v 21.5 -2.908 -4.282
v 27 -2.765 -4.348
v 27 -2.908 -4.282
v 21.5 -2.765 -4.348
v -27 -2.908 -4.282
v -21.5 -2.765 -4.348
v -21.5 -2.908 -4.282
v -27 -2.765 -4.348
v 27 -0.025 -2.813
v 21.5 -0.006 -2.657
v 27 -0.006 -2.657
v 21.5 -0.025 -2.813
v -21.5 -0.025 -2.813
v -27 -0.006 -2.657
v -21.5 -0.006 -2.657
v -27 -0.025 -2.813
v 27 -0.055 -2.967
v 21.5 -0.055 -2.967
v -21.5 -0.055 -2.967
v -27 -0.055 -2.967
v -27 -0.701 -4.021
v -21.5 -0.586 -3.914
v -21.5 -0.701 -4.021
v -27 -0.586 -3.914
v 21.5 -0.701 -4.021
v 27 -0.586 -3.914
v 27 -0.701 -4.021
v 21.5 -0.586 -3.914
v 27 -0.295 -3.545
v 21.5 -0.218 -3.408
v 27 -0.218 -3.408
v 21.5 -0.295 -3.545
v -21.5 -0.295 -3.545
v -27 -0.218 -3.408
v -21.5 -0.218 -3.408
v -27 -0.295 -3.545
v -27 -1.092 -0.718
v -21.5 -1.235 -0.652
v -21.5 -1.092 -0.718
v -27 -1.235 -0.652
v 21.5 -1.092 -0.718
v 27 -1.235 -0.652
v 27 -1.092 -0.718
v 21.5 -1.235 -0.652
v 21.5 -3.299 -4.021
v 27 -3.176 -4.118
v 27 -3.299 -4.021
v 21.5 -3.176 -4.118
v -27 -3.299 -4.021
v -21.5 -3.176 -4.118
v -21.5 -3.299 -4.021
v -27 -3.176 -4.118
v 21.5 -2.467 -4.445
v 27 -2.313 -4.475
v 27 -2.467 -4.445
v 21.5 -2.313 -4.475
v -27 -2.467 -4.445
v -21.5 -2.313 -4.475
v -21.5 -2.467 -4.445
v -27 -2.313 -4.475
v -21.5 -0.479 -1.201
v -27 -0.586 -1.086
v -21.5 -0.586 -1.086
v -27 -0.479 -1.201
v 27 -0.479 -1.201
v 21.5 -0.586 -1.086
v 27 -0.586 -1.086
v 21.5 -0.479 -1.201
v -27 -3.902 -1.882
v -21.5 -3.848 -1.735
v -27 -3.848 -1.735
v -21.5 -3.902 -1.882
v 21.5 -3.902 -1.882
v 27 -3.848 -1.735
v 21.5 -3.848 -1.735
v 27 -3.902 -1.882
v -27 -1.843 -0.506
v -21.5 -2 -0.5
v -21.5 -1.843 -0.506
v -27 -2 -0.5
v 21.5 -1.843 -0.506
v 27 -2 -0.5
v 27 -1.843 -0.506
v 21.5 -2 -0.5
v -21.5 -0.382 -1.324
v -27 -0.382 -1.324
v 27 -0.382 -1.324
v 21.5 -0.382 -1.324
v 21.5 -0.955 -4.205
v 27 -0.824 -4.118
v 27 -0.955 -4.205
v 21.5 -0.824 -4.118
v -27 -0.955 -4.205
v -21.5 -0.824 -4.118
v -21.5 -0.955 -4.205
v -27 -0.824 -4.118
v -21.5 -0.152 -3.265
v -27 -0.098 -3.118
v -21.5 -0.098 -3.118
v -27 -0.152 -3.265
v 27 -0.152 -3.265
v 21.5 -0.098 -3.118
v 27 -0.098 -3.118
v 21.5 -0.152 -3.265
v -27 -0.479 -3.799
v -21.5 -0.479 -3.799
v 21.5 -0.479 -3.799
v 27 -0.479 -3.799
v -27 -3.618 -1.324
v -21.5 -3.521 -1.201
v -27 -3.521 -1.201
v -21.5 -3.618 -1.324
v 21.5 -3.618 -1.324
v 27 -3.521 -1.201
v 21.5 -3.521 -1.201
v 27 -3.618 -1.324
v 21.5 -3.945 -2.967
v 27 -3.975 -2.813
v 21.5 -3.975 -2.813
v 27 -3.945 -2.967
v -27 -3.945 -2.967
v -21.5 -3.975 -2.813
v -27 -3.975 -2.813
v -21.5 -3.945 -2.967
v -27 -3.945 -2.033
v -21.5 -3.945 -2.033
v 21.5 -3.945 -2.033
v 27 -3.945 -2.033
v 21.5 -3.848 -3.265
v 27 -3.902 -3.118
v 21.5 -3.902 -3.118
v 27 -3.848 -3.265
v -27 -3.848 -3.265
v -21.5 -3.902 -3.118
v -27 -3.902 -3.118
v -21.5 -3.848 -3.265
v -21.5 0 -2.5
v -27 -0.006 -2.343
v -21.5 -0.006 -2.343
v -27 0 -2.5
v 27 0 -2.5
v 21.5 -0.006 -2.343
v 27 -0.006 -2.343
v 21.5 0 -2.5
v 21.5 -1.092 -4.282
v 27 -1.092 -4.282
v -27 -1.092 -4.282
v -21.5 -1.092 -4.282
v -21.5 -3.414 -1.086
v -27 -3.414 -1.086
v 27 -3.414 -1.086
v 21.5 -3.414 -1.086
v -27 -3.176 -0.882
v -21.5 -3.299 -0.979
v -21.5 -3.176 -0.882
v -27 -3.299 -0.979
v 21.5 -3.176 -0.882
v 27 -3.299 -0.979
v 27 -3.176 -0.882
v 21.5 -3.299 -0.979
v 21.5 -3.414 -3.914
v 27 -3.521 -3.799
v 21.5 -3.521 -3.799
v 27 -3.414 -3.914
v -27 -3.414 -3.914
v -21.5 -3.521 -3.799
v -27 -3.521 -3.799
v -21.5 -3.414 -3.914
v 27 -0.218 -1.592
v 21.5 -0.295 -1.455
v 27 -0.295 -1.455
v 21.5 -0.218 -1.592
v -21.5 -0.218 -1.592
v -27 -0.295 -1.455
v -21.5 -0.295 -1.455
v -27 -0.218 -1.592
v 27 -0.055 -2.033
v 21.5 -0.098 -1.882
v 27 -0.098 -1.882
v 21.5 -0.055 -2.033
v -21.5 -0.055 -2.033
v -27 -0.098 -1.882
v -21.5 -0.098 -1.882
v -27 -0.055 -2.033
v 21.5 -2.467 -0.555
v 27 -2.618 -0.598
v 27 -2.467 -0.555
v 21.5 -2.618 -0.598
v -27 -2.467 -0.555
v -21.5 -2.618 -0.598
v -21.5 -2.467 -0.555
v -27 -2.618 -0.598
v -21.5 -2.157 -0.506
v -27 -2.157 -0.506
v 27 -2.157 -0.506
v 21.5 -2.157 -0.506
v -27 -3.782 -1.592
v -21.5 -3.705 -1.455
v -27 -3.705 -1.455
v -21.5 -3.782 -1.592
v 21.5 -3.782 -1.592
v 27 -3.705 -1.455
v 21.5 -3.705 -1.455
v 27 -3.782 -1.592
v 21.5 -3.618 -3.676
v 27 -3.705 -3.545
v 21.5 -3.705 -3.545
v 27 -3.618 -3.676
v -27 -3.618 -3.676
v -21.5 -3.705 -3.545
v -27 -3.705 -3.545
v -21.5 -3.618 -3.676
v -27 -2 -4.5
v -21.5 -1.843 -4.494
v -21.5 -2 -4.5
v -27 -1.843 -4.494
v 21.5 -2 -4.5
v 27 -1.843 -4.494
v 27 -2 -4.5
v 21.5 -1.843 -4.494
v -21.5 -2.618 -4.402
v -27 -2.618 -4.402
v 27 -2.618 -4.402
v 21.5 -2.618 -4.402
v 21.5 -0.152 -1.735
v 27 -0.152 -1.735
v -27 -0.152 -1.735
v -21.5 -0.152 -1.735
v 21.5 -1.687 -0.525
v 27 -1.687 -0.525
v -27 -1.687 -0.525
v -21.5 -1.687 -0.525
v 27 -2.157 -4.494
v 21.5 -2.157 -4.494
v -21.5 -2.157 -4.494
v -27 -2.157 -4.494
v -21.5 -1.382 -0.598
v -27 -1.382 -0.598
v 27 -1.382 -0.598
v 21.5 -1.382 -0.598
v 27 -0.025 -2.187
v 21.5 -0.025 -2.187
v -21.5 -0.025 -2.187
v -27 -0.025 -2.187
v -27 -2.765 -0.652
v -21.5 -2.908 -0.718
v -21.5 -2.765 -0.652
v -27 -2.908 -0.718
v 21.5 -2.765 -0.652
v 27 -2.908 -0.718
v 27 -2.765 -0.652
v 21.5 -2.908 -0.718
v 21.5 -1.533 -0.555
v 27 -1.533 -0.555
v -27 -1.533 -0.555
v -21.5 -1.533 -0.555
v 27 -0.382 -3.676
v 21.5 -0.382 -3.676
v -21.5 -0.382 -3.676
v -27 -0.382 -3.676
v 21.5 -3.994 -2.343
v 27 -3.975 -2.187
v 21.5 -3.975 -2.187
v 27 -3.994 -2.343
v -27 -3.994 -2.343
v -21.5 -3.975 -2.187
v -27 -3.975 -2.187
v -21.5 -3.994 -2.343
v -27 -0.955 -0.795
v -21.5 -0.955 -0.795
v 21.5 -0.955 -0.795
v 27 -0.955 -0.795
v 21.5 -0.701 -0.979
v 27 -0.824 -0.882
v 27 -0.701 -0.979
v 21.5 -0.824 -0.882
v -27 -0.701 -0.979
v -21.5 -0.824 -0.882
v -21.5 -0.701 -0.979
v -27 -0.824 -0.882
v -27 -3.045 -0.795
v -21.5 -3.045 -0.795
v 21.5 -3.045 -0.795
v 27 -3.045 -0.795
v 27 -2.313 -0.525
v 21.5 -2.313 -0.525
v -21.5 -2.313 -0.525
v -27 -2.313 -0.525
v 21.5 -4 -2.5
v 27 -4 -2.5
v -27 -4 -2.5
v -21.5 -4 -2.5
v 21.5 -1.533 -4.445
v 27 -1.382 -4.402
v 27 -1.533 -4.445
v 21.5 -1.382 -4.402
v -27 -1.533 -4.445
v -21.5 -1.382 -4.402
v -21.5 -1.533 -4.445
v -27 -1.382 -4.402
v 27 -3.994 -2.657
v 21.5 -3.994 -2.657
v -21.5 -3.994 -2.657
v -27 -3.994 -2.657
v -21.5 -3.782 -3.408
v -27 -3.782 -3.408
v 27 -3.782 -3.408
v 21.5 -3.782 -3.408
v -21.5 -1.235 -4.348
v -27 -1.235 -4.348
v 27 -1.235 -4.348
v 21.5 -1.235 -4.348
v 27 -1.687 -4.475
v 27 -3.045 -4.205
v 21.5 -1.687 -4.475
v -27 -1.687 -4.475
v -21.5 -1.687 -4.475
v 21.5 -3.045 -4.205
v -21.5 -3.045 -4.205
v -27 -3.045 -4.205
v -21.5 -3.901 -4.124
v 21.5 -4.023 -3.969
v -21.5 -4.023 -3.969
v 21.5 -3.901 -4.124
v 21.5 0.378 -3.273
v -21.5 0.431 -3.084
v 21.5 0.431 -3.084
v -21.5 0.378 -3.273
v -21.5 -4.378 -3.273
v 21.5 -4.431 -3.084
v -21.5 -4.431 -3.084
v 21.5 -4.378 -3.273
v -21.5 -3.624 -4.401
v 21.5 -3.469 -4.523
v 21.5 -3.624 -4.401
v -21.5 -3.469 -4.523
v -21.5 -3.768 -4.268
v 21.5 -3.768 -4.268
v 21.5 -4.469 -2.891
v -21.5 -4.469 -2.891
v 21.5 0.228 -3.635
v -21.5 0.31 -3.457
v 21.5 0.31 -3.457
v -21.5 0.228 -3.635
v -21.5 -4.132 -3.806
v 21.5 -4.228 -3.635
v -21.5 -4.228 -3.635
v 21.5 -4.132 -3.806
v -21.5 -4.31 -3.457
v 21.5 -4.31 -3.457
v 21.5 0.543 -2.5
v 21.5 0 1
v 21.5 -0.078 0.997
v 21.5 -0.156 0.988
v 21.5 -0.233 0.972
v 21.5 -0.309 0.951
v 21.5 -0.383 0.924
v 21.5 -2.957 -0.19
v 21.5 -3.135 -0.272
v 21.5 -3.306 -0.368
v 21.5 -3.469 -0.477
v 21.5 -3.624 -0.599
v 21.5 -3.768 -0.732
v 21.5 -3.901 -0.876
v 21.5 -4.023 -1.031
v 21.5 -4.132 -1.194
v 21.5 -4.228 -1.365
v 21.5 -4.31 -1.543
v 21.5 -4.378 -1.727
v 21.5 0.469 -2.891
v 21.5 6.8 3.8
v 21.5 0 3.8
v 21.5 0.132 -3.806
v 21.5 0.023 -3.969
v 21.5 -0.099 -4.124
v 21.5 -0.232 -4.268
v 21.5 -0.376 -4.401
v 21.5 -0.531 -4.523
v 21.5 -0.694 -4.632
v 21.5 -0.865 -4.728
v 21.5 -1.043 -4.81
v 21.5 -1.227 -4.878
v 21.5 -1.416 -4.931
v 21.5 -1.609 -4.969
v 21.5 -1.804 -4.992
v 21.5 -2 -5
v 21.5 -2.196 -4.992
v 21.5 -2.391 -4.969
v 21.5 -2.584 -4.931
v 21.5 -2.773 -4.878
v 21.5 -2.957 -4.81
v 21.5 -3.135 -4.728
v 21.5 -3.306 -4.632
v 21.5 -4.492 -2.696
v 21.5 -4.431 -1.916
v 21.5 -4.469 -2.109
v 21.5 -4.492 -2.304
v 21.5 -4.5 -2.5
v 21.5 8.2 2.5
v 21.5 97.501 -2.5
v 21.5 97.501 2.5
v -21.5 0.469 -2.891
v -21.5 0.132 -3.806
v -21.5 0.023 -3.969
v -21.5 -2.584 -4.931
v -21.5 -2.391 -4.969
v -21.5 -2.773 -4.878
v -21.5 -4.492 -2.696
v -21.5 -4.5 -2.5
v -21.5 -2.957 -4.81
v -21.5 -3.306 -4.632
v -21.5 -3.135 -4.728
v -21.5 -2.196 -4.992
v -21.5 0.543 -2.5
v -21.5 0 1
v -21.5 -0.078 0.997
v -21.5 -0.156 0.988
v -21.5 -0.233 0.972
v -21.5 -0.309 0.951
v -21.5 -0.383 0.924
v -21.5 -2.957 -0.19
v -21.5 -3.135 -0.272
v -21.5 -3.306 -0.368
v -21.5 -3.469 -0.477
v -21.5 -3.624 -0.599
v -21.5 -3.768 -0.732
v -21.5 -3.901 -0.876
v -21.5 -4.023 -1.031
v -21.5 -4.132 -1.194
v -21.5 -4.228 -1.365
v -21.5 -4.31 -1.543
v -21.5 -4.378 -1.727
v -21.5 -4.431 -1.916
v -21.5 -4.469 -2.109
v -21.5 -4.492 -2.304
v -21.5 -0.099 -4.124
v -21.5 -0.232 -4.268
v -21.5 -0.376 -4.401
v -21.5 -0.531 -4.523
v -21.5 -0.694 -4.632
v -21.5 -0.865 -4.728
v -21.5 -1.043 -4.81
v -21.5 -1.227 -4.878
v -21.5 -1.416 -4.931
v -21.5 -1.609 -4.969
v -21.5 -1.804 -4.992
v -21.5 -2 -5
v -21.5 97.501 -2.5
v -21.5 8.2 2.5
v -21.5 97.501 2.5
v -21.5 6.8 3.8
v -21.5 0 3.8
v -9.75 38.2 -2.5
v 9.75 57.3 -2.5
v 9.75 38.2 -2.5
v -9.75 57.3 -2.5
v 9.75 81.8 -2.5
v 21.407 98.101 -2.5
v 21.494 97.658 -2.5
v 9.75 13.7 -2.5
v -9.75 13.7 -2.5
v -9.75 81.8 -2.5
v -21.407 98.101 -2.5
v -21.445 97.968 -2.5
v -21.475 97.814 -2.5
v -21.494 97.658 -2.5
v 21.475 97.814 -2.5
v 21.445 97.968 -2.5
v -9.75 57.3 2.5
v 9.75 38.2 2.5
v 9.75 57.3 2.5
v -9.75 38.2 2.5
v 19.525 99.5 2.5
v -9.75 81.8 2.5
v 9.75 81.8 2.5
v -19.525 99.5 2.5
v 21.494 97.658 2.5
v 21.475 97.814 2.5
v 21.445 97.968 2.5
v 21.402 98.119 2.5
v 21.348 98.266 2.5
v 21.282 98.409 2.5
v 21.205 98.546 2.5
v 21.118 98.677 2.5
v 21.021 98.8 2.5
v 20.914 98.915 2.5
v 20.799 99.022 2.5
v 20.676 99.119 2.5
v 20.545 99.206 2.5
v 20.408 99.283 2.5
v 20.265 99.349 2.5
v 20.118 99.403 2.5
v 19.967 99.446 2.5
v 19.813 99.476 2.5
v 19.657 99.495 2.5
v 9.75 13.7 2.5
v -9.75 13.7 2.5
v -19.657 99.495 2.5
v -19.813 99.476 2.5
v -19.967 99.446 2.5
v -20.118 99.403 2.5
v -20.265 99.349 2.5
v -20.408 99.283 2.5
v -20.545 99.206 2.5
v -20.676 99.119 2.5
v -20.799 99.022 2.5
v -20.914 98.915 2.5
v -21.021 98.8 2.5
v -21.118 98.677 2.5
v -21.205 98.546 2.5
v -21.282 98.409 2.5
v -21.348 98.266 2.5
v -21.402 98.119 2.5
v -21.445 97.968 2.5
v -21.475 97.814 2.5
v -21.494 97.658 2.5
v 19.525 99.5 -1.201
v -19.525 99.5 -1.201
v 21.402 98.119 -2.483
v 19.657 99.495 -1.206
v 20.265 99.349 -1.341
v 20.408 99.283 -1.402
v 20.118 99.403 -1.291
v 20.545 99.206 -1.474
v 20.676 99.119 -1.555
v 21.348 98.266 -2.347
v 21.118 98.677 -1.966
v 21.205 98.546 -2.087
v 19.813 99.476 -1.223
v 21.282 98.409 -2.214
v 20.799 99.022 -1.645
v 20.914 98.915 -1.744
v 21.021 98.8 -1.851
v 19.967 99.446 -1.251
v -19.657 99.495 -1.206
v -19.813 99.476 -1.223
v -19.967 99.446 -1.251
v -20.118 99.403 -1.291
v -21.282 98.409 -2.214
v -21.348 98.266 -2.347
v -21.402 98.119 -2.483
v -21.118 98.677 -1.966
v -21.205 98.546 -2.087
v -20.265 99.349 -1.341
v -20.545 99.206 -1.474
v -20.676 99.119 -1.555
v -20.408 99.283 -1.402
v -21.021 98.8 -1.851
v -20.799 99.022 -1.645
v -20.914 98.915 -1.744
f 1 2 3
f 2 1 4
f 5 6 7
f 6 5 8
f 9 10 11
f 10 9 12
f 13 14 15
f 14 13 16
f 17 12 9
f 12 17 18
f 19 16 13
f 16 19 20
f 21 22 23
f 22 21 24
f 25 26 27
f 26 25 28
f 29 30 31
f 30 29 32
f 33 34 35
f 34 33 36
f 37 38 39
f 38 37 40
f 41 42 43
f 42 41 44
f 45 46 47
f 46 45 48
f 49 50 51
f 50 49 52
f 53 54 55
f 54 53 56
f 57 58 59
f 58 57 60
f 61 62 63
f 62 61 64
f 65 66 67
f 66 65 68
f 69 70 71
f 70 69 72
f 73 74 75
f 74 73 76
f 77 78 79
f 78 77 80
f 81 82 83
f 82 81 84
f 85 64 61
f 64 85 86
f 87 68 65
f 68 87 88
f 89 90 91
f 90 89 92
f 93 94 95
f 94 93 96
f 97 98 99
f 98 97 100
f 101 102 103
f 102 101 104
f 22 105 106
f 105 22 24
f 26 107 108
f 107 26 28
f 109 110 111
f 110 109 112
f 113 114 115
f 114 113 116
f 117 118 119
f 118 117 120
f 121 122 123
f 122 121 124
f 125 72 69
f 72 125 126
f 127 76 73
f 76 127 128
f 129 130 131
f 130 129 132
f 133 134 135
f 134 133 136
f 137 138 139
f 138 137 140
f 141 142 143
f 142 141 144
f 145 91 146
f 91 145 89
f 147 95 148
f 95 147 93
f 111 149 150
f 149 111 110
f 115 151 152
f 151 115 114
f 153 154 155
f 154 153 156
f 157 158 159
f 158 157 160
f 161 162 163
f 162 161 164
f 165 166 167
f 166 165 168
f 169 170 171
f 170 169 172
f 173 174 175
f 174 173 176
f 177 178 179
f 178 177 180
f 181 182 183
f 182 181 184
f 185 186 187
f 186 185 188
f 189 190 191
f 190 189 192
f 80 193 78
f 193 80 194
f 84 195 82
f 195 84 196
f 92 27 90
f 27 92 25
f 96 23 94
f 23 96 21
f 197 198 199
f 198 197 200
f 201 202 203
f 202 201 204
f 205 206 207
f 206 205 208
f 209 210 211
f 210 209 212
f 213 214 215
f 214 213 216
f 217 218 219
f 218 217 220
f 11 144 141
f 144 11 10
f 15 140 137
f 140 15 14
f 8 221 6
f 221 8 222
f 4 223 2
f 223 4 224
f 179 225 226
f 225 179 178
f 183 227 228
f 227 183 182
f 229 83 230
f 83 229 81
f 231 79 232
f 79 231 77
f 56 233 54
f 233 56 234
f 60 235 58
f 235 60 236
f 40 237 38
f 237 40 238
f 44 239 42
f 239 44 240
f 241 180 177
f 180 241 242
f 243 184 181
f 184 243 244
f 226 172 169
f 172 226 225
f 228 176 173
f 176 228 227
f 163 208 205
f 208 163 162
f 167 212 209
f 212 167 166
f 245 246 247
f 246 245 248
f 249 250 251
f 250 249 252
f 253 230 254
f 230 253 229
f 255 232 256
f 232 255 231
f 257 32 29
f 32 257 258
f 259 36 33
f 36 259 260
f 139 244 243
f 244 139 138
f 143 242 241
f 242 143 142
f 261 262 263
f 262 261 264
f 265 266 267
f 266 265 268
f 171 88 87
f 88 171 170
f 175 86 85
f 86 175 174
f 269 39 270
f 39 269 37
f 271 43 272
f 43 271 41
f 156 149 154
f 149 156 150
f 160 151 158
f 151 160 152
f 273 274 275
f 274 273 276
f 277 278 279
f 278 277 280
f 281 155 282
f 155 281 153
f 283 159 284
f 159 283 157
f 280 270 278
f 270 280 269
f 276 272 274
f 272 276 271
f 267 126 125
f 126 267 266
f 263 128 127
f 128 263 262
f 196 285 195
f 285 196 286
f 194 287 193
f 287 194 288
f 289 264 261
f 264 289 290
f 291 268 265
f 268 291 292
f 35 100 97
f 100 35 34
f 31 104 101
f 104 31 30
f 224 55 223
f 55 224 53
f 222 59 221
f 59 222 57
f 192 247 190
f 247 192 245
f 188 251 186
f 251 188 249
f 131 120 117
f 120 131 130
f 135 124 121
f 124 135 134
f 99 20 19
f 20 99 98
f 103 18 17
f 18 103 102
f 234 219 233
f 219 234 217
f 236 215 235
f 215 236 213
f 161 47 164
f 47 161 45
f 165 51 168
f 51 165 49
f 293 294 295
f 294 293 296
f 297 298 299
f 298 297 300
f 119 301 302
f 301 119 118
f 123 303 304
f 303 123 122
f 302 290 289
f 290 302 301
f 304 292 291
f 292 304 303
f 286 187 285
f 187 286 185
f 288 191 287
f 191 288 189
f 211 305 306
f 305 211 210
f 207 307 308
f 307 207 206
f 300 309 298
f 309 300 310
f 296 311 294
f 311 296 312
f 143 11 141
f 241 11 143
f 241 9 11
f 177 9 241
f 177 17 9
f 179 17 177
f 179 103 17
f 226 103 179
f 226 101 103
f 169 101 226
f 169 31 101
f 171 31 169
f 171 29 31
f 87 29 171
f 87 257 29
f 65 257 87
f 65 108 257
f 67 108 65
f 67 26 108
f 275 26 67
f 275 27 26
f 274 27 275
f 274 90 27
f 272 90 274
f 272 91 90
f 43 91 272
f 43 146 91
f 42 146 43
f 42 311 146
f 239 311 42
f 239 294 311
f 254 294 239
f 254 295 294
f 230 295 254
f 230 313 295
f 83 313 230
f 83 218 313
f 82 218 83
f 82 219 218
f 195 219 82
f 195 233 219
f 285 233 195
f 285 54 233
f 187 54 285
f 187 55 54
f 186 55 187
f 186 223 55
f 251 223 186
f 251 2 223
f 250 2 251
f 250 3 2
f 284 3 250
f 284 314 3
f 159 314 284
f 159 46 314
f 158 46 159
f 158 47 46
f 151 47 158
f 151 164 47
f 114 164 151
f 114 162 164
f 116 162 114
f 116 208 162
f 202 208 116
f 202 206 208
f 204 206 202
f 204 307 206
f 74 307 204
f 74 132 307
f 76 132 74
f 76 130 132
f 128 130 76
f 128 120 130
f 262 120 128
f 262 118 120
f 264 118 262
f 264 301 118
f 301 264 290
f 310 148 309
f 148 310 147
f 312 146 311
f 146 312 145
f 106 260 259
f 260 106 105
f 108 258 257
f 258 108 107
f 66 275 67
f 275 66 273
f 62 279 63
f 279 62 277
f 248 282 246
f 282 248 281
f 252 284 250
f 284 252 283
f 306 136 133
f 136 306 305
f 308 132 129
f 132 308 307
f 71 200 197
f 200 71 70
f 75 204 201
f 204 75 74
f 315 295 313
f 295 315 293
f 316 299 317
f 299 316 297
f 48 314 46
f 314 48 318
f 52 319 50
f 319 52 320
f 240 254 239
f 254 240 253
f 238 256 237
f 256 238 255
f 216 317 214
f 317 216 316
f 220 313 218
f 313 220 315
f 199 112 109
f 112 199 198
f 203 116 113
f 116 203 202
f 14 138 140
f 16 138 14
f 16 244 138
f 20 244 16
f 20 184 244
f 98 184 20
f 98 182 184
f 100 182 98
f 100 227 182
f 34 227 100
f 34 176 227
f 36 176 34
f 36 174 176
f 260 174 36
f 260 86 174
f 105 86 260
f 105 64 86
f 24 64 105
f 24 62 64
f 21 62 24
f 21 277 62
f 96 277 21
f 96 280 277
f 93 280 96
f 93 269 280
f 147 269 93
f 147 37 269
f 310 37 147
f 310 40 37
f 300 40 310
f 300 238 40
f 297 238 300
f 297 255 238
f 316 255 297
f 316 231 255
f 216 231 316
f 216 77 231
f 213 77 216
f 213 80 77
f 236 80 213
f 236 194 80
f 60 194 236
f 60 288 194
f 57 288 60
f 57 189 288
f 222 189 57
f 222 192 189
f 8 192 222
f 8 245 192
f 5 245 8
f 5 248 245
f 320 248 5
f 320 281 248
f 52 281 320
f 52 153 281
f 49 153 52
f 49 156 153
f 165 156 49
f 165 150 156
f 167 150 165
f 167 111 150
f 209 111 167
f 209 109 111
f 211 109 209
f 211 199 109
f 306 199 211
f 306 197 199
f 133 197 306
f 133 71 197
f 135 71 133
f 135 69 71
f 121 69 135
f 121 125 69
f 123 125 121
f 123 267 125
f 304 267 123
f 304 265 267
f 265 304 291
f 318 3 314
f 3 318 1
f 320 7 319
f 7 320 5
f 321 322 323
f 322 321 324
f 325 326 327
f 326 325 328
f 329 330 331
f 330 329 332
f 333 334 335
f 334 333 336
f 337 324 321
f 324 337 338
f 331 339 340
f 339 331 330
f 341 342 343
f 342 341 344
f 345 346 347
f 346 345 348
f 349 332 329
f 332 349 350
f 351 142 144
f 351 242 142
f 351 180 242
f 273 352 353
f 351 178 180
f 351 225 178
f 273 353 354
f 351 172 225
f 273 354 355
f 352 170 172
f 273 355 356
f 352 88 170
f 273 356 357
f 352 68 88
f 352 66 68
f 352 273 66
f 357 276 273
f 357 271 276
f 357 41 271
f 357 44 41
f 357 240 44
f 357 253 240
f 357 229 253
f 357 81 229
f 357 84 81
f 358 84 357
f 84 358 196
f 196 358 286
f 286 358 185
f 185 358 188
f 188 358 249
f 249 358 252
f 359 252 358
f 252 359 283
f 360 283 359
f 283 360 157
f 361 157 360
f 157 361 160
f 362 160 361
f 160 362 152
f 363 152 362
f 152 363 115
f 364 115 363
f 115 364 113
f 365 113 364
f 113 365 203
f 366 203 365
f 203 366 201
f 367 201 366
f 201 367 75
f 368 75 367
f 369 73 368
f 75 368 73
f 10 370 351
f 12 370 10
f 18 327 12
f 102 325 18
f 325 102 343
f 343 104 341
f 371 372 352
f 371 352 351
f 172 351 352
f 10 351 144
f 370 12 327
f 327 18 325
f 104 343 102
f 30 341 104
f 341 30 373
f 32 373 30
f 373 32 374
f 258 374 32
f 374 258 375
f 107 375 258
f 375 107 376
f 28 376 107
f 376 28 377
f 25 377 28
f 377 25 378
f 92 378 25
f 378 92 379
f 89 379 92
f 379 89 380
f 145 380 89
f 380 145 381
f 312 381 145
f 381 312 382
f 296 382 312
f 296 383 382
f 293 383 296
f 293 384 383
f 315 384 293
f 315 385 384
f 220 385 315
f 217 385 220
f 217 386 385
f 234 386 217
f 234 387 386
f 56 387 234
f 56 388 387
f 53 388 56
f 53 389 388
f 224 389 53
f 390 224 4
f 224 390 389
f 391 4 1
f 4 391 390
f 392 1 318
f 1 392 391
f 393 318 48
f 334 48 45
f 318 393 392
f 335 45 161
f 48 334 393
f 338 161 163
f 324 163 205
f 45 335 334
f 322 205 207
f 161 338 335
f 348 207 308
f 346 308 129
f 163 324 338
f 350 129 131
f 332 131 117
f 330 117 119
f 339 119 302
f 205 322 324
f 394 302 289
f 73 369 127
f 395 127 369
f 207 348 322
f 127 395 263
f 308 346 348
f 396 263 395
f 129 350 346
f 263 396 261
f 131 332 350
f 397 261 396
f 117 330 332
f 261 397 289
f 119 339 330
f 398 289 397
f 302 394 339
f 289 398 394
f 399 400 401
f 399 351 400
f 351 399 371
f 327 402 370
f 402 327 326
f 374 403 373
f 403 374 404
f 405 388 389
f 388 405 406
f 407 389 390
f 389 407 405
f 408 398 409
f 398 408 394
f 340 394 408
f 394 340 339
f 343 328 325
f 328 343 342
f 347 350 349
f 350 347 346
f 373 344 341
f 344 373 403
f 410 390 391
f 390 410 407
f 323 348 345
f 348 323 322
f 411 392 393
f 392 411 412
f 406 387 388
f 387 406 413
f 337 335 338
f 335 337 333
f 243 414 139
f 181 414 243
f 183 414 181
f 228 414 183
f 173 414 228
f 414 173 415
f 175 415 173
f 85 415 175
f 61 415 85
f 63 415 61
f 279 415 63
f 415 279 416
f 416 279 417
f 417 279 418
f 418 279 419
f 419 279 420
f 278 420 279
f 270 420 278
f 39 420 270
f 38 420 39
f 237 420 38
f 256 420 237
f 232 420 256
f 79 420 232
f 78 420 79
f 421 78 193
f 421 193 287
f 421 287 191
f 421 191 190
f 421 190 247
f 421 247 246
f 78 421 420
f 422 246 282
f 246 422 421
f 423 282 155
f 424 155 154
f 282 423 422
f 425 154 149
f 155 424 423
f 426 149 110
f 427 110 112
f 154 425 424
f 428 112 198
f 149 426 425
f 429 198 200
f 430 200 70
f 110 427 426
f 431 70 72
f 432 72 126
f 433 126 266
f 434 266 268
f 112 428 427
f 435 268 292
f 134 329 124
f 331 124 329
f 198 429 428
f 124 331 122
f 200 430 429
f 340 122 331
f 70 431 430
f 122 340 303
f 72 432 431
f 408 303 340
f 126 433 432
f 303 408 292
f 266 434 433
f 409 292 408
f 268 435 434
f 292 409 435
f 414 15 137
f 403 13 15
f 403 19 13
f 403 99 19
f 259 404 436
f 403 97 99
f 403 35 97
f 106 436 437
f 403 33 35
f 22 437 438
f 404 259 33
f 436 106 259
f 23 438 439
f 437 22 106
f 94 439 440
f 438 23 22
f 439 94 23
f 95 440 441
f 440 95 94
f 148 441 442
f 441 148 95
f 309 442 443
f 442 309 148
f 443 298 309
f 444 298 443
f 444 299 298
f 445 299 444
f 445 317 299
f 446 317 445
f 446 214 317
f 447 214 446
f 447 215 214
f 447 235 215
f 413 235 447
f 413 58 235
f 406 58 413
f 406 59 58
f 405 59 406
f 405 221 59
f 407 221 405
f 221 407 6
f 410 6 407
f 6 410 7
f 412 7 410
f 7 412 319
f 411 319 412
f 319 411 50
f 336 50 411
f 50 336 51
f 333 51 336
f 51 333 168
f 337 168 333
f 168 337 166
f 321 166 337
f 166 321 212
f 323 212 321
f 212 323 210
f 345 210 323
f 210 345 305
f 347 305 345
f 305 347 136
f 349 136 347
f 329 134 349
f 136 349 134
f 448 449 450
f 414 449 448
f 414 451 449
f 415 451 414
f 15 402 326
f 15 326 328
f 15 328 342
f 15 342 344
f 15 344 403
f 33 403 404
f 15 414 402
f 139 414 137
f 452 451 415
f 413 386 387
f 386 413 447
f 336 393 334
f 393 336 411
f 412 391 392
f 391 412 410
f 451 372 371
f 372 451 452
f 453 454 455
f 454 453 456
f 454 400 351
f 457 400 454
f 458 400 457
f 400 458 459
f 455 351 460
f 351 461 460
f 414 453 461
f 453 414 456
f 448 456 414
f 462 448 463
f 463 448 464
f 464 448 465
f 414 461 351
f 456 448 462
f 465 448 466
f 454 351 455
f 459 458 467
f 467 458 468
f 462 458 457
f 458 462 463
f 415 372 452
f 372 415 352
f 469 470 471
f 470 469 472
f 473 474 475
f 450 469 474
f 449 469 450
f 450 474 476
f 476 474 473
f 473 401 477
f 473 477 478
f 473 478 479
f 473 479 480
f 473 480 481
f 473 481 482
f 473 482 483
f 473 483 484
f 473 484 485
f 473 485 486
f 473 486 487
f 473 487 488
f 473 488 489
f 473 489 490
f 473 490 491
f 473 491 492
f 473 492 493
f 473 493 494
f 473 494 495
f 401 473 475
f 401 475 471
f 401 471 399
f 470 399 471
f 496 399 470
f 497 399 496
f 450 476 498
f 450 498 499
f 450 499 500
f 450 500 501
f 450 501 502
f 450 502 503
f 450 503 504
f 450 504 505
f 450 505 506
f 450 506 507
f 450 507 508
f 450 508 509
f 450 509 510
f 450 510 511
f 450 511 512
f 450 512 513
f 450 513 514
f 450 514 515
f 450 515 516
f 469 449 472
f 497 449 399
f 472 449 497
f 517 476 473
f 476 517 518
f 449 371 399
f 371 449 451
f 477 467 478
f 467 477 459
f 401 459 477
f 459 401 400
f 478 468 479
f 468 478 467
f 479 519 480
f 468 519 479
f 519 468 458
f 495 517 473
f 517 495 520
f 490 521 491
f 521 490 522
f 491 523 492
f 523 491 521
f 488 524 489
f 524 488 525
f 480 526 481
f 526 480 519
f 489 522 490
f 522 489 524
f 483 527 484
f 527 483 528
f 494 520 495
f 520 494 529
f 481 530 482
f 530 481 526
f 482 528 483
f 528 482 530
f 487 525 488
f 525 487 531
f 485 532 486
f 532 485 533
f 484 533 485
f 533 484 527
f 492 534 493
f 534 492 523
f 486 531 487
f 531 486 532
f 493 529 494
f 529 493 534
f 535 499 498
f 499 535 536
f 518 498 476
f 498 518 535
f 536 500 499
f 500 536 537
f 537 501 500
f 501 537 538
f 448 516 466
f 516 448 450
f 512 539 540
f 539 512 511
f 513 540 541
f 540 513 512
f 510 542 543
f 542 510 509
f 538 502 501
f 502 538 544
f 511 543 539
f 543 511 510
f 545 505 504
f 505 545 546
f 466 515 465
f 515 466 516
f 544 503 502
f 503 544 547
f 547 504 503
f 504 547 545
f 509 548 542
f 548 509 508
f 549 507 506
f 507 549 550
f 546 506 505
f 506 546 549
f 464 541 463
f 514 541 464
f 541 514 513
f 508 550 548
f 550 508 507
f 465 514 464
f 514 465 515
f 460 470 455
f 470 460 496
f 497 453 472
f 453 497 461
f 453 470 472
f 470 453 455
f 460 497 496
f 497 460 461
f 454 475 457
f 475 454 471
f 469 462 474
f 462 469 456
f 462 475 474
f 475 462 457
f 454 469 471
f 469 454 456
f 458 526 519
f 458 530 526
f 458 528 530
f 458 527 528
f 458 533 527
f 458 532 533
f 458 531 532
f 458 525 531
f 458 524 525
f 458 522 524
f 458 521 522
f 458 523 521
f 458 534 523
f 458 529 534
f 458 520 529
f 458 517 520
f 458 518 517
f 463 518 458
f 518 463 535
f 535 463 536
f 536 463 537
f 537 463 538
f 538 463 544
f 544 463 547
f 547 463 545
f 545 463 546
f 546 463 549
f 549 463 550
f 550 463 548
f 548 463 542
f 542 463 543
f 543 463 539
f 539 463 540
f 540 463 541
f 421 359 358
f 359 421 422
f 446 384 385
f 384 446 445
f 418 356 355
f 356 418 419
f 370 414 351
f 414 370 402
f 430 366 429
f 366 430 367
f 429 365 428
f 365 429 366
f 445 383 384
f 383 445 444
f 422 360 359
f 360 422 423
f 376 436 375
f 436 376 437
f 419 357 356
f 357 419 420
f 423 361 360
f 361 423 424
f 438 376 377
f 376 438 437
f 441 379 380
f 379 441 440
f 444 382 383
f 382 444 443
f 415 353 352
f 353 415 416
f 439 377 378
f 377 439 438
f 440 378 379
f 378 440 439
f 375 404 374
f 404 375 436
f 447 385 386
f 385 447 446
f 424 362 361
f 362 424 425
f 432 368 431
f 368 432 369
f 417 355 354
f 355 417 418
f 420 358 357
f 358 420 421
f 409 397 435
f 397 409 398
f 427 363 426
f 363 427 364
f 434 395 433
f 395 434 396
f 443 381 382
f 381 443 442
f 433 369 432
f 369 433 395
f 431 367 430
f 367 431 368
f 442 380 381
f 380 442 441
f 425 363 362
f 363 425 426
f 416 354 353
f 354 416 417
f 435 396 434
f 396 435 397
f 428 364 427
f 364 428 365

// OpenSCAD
// Tektronix DMM916 Kickstand
//
// My Tektronix digitial multimeter has a flexible plastic shock cover
// with an integrated kickstand. As the lugs had brocken off the original 
// kickstand I decided to print a new one.
//
// Depending on your printer and material you can choose to generate
// a single piece or instead print 3 pieces with no overhang which
// can be glued together.
//
// Note that as the middle part comprises three separated sections it will
// be easiest to leave them attached to the print bed and glue on part 1
// before removal from the printer.

part(); // Print in one piece if your printer can handle this,
//partial_part_1(); // otherwis print and glue together these 3 pieces.
//partial_part_2();
//partial_part_middle(); // Glue on part 1 before removing from print bed.

// Original part measurements and other constants
$fn=80;

catch_length        = 54.0;
catch_radius        =  2.0;
barrel_length       = 43.0;
barrel_radius       =  2.5;
stand_legth         = 99.5;
stand_width         = 43.0;
stand_rounding      =  2.0;
stand_rounding      =  2.0;
stand_thickness     =  5.0;
stand_end_thickness =  6.3;
stand_end_lenth_1   =  6.8;
stand_end_lenth_2   =  8.2;
stand_end_to_void_1 = 13.7;
stand_end_to_void_2 = 57.3;
stand_void_length   = 24.5;
stand_void_width    = 19.5;


module partial_part_1()
{
  partial = stand_void_width/2;
  translate([0,0,-partial])difference()
  {
    rotate([0,270,0])part();
    translate([0,0,-50+partial])cube([200,200,100],true);
  }  
}

module partial_part_2()
{
  partial = stand_void_width/2;
  translate([0,0,-partial])difference()
  {
    rotate([0,90,0])part();
    translate([0,0,-50+partial])cube([200,200,100],true);
  }  
}

module partial_part_middle()
{
  partial_middle = stand_void_width/2;

  difference()
  {
    translate([0,0,partial_middle])difference()
    {
      rotate([0,270,0])part();
      translate([0,0,-50-partial_middle])cube([200,200,100],true);
    }
    translate([0,0,partial_middle])difference()
    {
      rotate([0,270,0])part();
      translate([0,0,-50+partial_middle])cube([200,200,100],true);
    }
  }  
}

module part()
{
  union()
  {
    pin();
    stand();
    hull()
    {
      rotate([90,0,90])translate([0,0,-barrel_length/2])cylinder(barrel_length,r=catch_radius/2,true);;
      translate([0,-catch_radius,-stand_thickness/2])barrel();
    }  
  }
}

module pin(){translate([0,-catch_radius,-stand_thickness/2])union(){catch();barrel();}}
module barrel(){rotate([90,0,90])translate([0,0,-barrel_length/2])cylinder(barrel_length,r=barrel_radius,true);}
module catch(){rotate([90,0,90])translate([0,0,-catch_length/2])cylinder(catch_length,r=catch_radius,true);}

module stand()
{
  difference()
  {
    union()
    {
      translate([0,stand_end_lenth_1/2,(stand_end_thickness-stand_thickness)/2])cube([stand_width,stand_end_lenth_1,stand_end_thickness],true);
      translate([0,stand_legth/2,0])cube([stand_width,stand_legth,stand_thickness],true);
      translate([0,stand_end_lenth_1,stand_thickness/2])rotate([0,270,0])linear_extrude(height=stand_width,center=true,10, twist = 0)
        polygon(points=[[0,0],[0,stand_end_lenth_2-stand_end_lenth_1],[stand_end_thickness-stand_thickness,0]]);
    }
    translate([0,stand_end_to_void_1,0])void();  
    translate([0,stand_end_to_void_2,0])void();  
    translate([0,stand_legth,-0.001-stand_thickness/2])rotate([180,270,0])linear_extrude(height=stand_width,center=true,10, twist = 0)
      polygon(points=[[0,0],[0,stand_end_lenth_2-stand_end_lenth_1],[stand_end_thickness-stand_thickness,0]]);
    translate([stand_width/2,stand_legth+.001,0])rounding_cutter();
    translate([-stand_width/2,stand_legth+.001,0])rotate([0,0,90])rounding_cutter();

  }
}
module void()
{
  translate([0,stand_void_length/2,0])cube([stand_void_width,stand_void_length,stand_thickness],true);
}  

module rounding_cutter()
{
  translate([-stand_rounding,-stand_rounding,0])intersection()
  {
    difference()
    {
      cube([stand_rounding*2,stand_rounding*2,stand_thickness],true);
      cylinder(20,r=stand_rounding,center=true);
    }
    translate([stand_rounding/2,stand_rounding/2,0])cube([stand_rounding,stand_rounding,stand_thickness],true);
  }
  
}  
